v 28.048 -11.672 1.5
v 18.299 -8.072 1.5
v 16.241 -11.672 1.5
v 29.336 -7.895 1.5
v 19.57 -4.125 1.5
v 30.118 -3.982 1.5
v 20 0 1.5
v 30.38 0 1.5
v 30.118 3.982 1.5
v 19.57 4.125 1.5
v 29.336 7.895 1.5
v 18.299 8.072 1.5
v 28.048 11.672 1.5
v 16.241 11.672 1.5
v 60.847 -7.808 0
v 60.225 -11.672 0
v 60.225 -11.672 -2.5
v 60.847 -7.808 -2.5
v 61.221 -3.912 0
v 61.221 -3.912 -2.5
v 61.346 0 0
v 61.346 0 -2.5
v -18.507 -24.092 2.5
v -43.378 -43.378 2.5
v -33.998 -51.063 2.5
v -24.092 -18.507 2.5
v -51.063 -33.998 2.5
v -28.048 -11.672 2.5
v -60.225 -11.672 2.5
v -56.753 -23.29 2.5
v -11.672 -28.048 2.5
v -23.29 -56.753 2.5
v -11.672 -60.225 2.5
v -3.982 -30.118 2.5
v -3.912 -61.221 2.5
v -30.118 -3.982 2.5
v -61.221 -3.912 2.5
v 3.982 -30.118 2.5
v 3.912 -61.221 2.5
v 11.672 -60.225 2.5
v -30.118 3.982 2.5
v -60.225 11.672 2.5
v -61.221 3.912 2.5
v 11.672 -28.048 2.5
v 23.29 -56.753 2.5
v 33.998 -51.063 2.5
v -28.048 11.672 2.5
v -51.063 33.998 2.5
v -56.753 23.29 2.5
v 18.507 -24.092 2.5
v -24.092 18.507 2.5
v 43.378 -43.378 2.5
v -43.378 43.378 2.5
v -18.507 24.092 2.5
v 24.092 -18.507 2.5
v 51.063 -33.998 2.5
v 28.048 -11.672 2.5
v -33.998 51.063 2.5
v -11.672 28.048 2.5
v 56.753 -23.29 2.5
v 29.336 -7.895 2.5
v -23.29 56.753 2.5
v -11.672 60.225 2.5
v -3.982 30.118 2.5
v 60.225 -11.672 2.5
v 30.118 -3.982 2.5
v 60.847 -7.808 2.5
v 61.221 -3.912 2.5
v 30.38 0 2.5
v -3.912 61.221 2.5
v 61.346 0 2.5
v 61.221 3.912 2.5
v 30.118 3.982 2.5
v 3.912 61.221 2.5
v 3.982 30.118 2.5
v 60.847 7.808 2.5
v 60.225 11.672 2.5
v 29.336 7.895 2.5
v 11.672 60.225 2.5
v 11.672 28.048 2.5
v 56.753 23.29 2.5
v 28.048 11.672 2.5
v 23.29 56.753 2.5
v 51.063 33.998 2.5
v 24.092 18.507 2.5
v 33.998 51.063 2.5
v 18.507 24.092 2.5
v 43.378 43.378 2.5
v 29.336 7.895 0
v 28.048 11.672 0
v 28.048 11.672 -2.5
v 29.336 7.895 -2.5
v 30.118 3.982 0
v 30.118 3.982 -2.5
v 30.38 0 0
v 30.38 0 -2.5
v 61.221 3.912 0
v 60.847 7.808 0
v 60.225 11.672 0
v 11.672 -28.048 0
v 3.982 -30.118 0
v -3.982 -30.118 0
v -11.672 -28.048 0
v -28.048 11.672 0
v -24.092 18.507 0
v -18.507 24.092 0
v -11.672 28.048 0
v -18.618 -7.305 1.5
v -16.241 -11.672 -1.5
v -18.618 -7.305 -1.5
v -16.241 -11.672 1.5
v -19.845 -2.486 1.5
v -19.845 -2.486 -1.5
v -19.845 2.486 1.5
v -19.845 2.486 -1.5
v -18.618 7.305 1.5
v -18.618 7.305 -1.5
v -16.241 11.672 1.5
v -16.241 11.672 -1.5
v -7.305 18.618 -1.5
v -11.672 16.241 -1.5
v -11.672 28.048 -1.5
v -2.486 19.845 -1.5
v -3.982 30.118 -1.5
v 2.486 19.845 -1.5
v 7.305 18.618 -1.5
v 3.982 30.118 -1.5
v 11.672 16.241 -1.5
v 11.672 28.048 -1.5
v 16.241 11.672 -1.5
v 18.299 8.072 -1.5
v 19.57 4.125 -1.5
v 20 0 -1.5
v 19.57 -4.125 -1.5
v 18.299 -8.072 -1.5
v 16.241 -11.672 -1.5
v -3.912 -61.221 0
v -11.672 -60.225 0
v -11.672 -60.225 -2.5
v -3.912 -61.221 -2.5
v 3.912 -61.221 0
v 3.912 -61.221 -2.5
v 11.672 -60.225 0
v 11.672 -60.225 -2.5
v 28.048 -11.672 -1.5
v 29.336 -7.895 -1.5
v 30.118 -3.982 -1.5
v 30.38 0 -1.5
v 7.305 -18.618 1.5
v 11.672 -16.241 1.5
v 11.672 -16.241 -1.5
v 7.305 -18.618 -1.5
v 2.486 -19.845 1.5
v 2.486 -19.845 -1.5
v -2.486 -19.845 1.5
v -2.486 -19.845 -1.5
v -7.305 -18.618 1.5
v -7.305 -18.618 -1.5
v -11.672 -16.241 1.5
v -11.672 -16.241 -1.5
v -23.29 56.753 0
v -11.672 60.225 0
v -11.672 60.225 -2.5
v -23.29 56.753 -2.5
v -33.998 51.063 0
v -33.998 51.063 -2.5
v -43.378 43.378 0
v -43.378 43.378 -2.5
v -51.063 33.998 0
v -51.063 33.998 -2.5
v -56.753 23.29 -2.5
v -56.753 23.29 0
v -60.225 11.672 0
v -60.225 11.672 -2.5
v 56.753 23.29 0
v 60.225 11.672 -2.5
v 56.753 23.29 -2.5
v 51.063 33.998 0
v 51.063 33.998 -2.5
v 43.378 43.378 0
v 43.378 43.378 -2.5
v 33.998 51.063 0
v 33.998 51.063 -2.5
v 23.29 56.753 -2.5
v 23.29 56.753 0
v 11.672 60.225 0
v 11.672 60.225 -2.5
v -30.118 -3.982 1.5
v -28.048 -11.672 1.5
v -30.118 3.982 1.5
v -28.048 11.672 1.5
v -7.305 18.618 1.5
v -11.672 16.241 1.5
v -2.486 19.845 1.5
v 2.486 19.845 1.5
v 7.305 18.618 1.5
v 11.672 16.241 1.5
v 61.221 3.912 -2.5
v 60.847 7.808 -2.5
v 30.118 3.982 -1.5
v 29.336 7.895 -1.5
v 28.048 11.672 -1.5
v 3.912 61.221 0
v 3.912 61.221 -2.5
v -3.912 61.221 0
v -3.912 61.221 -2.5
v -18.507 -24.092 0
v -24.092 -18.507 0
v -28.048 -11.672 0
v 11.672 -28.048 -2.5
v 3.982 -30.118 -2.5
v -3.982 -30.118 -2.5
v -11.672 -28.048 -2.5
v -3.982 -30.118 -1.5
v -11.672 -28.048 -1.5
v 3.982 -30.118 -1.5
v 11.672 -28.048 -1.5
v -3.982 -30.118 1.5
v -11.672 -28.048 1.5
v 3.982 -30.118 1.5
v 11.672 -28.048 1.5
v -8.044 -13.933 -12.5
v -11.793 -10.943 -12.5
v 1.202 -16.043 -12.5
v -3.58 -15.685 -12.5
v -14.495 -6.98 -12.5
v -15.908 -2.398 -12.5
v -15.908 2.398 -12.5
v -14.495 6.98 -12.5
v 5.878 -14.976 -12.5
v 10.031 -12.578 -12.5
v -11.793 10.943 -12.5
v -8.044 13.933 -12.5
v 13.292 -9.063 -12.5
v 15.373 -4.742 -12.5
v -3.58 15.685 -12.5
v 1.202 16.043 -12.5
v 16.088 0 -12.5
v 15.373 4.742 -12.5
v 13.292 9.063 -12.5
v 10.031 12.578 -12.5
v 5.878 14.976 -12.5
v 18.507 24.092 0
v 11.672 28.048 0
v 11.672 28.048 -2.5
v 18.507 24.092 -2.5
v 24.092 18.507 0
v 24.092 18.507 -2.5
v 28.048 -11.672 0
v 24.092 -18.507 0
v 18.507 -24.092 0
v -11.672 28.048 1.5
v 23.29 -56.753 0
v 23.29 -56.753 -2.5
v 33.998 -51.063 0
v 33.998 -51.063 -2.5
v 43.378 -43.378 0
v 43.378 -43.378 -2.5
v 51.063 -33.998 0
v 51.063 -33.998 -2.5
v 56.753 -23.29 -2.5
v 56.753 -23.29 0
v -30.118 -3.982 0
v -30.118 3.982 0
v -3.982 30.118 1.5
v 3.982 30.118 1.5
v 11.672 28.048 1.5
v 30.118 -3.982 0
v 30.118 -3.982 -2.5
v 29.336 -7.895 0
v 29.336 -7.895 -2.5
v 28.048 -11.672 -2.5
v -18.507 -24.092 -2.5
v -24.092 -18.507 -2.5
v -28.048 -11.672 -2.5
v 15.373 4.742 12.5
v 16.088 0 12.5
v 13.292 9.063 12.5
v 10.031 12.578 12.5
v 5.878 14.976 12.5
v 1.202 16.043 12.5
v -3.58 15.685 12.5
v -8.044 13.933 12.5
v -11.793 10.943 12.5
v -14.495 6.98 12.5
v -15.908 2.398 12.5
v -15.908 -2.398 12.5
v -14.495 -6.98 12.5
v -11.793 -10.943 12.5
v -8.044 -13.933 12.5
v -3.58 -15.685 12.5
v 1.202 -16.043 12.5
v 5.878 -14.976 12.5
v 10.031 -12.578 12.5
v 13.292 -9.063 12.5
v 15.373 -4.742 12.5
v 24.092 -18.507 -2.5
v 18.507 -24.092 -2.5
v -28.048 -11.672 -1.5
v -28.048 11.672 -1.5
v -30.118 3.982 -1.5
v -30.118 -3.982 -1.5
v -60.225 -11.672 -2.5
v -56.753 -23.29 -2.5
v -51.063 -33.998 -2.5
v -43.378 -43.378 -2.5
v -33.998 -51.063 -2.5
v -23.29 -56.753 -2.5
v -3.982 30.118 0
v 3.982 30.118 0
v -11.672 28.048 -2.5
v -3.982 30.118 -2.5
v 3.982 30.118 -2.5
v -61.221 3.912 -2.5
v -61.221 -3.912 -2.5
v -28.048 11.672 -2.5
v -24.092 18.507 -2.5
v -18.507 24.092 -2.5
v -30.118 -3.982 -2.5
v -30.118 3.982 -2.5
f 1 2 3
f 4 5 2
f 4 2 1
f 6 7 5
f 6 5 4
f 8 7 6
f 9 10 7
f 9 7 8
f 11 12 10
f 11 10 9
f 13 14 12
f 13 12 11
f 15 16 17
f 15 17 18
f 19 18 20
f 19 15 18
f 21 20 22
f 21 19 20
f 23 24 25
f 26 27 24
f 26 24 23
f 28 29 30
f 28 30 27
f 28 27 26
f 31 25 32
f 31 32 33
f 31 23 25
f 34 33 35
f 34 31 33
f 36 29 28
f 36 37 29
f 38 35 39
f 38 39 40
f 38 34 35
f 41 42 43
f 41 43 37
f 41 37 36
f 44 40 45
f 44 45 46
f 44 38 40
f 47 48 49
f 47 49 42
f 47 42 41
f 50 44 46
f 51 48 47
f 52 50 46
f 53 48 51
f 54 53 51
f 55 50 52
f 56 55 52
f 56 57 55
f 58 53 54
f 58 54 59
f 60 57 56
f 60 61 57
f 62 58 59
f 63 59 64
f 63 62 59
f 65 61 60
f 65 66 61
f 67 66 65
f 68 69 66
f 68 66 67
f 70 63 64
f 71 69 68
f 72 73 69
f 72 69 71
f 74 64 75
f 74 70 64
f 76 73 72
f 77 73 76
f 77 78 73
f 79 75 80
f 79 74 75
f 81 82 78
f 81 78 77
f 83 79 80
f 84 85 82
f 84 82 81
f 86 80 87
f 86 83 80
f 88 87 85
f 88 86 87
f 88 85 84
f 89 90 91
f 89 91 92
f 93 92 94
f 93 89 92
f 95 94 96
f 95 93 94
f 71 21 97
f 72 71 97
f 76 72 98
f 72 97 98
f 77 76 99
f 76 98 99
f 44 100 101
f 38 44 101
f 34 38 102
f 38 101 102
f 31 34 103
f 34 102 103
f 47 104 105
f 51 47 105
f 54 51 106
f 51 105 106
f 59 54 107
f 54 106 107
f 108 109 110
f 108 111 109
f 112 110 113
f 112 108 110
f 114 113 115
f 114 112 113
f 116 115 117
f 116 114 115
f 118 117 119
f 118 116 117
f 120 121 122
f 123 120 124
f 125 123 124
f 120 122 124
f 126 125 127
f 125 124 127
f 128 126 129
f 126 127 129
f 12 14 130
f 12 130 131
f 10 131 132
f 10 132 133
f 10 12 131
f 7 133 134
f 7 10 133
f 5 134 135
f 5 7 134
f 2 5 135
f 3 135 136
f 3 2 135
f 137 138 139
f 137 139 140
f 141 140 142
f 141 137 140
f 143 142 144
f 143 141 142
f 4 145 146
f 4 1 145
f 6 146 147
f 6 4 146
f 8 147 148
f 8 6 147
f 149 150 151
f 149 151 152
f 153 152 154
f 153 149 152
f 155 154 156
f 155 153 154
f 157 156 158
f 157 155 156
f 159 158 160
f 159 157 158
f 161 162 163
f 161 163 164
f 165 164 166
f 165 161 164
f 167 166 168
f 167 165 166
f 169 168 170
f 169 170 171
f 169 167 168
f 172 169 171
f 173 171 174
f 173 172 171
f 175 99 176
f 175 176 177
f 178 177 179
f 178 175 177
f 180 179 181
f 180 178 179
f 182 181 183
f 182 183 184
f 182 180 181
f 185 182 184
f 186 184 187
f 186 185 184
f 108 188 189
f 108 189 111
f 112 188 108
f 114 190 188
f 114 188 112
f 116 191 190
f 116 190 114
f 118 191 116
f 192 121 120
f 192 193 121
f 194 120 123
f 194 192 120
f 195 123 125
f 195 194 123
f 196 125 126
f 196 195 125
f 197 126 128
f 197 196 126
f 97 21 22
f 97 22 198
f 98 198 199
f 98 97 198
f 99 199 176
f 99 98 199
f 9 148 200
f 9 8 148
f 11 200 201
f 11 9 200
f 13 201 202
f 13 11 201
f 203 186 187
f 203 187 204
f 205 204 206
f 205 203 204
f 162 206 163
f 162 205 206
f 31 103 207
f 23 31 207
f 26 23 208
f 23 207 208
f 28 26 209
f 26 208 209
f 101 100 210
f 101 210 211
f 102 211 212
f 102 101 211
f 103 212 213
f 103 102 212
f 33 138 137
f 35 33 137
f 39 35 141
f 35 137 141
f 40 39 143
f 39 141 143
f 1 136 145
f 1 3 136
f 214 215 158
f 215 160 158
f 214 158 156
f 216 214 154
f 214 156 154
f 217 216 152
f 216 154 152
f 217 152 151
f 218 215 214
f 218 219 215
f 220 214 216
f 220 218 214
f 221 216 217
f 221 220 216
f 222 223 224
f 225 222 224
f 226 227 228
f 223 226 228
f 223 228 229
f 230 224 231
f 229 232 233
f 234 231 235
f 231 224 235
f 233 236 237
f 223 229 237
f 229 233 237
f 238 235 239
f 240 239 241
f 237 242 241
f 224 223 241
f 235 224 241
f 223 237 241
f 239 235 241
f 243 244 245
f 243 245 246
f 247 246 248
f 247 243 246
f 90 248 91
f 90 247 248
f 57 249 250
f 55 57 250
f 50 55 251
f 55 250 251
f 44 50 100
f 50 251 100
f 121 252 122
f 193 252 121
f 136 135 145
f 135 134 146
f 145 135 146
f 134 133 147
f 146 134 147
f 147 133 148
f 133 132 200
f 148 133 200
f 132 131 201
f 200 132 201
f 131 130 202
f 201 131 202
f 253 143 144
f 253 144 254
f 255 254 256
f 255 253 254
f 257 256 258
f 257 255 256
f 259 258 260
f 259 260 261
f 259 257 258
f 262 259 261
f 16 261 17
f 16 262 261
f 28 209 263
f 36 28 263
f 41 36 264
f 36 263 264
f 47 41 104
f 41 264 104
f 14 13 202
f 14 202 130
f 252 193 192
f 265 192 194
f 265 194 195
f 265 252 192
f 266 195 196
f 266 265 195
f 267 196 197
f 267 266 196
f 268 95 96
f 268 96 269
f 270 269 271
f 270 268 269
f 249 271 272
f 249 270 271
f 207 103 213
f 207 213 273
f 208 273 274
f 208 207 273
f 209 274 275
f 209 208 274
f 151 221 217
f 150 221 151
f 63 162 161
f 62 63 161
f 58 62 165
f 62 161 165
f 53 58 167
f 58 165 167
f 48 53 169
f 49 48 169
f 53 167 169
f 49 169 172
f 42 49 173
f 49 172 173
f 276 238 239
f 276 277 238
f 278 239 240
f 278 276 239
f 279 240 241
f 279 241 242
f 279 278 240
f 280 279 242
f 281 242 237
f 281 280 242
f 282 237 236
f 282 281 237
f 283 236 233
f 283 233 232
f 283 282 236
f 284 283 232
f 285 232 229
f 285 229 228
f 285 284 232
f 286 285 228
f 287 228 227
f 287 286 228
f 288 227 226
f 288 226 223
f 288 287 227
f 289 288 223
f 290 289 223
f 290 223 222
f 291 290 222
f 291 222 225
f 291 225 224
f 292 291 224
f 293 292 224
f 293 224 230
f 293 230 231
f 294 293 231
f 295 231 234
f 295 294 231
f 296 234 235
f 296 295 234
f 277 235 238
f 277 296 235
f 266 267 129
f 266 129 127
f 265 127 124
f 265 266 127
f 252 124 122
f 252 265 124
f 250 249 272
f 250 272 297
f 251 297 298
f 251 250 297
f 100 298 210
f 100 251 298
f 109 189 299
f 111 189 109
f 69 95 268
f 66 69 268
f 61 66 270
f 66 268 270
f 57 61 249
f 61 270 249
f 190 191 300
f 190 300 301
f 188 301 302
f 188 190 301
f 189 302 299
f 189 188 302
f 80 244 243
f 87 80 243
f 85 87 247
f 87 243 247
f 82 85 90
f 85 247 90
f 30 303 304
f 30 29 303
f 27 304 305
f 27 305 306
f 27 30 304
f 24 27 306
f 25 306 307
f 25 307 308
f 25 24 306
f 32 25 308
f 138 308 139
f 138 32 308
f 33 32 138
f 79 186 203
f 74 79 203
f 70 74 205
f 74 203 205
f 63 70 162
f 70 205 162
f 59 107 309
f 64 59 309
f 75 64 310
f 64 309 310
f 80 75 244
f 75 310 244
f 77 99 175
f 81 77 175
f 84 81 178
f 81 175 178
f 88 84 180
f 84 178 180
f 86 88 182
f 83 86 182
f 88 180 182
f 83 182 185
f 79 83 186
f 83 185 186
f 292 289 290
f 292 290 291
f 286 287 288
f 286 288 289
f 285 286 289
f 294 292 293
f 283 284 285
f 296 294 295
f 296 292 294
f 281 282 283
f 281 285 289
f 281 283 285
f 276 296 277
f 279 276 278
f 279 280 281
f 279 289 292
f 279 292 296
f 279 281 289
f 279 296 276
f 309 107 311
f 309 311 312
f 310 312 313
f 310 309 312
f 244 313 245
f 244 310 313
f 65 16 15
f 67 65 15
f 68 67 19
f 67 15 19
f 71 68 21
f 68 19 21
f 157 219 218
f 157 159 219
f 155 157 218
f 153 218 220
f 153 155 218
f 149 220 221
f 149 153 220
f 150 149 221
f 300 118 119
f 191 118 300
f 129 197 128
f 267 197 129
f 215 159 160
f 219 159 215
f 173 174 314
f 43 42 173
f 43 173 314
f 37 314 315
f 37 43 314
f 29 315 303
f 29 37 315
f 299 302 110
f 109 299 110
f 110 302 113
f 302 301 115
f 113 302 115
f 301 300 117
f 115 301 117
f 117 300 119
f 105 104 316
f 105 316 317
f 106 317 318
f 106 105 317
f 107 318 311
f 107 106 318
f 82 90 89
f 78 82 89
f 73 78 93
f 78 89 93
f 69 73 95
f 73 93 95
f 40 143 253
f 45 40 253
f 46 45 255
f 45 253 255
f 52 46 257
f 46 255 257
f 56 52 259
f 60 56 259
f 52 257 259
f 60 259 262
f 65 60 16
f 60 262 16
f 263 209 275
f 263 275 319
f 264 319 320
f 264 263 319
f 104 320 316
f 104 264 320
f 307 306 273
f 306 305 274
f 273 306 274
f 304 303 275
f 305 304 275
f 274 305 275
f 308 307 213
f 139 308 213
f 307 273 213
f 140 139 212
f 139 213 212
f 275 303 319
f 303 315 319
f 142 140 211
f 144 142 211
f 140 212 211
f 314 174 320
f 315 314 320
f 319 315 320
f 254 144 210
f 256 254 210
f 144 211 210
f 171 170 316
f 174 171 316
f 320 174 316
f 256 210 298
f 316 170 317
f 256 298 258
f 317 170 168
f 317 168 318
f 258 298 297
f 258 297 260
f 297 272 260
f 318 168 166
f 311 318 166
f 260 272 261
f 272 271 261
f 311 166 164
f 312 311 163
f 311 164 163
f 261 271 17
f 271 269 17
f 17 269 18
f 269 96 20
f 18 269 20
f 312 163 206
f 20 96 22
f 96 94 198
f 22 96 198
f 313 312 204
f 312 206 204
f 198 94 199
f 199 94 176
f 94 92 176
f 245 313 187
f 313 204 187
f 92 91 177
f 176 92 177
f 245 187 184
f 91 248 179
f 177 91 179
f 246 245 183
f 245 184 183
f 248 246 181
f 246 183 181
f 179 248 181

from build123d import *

# Parameters (mm, degrees)
F1_DEPTH = 2.5
F2_DEPTH = 1.5
F0_R     = 16.0879189499
F3_DEPTH = 12.5


with BuildPart() as f1:
    # F0 (on Top) → F1 (new body, symmetric)
    with BuildSketch(Plane.XY):
        with BuildLine():
            ThreePointArc((-60.2253776831, -11.6721854729), (-43.3781974659, -43.3781974659), (-11.6721854729, -60.2253776831))
            Line((-11.6721854729, -60.2253776831), (-11.6721854729, -28.0478593798))
            ThreePointArc((-11.6721854729, -28.0478593798), (-21.4816471611, -21.4816471611), (-28.0478593798, -11.6721854729))
            Line((-28.0478593798, -11.6721854729), (-60.2253776831, -11.6721854729))
        make_face()
        with BuildLine():
            Line((-28.0478593798, 11.6721854729), (-60.2253776831, 11.6721854729))
            ThreePointArc((-60.2253776831, 11.6721854729), (-61.3460351676, 0), (-60.2253776831, -11.6721854729))
            Line((-60.2253776831, -11.6721854729), (-28.0478593798, -11.6721854729))
            ThreePointArc((-28.0478593798, -11.6721854729), (-30.3796367573, 0), (-28.0478593798, 11.6721854729))
        make_face()
        with BuildLine():
            Line((-11.6721854729, 28.0478593798), (-11.6721854729, 60.2253776831))
            ThreePointArc((-11.6721854729, 60.2253776831), (-43.3781974659, 43.3781974659), (-60.2253776831, 11.6721854729))
            Line((-60.2253776831, 11.6721854729), (-28.0478593798, 11.6721854729))
            ThreePointArc((-28.0478593798, 11.6721854729), (-21.4816471611, 21.4816471611), (-11.6721854729, 28.0478593798))
        make_face()
        with BuildLine():
            Line((11.6721854729, 28.0478593799), (11.6721854729, 60.2253776831))
            ThreePointArc((11.6721854729, 60.2253776831), (0, 61.3460351676), (-11.6721854729, 60.2253776831))
            Line((-11.6721854729, 60.2253776831), (-11.6721854729, 28.0478593798))
            ThreePointArc((-11.6721854729, 28.0478593798), (0, 30.3796367573), (11.6721854729, 28.0478593798))
        make_face()
        with BuildLine():
            Line((28.0478593798, 11.6721854729), (60.2253776831, 11.6721854729))
            ThreePointArc((60.2253776831, 11.6721854729), (43.3781974659, 43.3781974659), (11.6721854729, 60.2253776831))
            Line((11.6721854729, 60.2253776831), (11.6721854729, 28.0478593799))
            ThreePointArc((11.6721854729, 28.0478593798), (21.4816471611, 21.4816471611), (28.0478593798, 11.6721854729))
        make_face()
        with BuildLine():
            ThreePointArc((60.2253776831, -11.6721854729), (61.0652281094, -5.8629298757), (61.3460351676, 0))
            ThreePointArc((61.3460351676, 0), (61.0652281094, 5.8629298757), (60.2253776831, 11.6721854729))
            Line((60.2253776831, 11.6721854729), (28.0478593798, 11.6721854729))
            ThreePointArc((28.0478593798, 11.6721854729), (29.7909894875, 5.9514094854), (30.3796367573, 0))
            ThreePointArc((30.3796367573, 0), (29.7909894875, -5.9514094854), (28.0478593798, -11.6721854729))
            Line((28.0478593798, -11.6721854729), (60.2253776831, -11.6721854729))
        make_face()
        with BuildLine():
            ThreePointArc((11.6721854729, -60.2253776831), (43.3781974659, -43.3781974659), (60.2253776831, -11.6721854729))
            Line((60.2253776831, -11.6721854729), (28.0478593798, -11.6721854729))
            ThreePointArc((28.0478593798, -11.6721854729), (21.4816471611, -21.4816471611), (11.6721854729, -28.0478593798))
            Line((11.6721854729, -28.0478593799), (11.6721854729, -60.2253776831))
        make_face()
        with BuildLine():
            ThreePointArc((-11.6721854729, -60.2253776831), (0, -61.3460351676), (11.6721854729, -60.2253776831))
            Line((11.6721854729, -60.2253776831), (11.6721854729, -28.0478593799))
            ThreePointArc((11.6721854729, -28.0478593798), (0, -30.3796367573), (-11.6721854729, -28.0478593798))
            Line((-11.6721854729, -28.0478593798), (-11.6721854729, -60.2253776831))
        make_face()
    extrude(amount=F1_DEPTH, both=True)


with BuildPart() as f2:
    # F0 (on Top) → F2 (new body, symmetric)
    with BuildSketch(Plane.XY):
        with BuildLine():
            Line((-16.240692297, 11.6721854729), (-28.0478593798, 11.6721854729))
            ThreePointArc((-28.0478593798, 11.6721854729), (-30.3796367573, 0), (-28.0478593798, -11.6721854729))
            Line((-28.0478593798, -11.6721854729), (-16.240692297, -11.6721854729))
            ThreePointArc((-16.240692297, -11.6721854729), (-20, 0), (-16.240692297, 11.6721854729))
        make_face()
    extrude(amount=F2_DEPTH, both=True)


with BuildPart() as f2b:
    # F0 (on Top) → F2, piece 2 (new body, symmetric)
    with BuildSketch(Plane.XY):
        with BuildLine():
            Line((11.6721854729, 16.240692297), (11.6721854729, 28.0478593799))
            ThreePointArc((11.6721854729, 28.0478593798), (0, 30.3796367573), (-11.6721854729, 28.0478593798))
            Line((-11.6721854729, 28.0478593798), (-11.6721854729, 16.240692297))
            ThreePointArc((-11.6721854729, 16.240692297), (0, 20), (11.6721854729, 16.240692297))
        make_face()
    extrude(amount=F2_DEPTH, both=True)


with BuildPart() as f2c:
    # F0 (on Top) → F2, piece 3 (new body, symmetric)
    with BuildSketch(Plane.XY):
        with BuildLine():
            ThreePointArc((30.3796367573, 0), (29.7909894875, 5.9514094854), (28.0478593798, 11.6721854729))
            Line((28.0478593798, 11.6721854729), (16.240692297, 11.6721854729))
            ThreePointArc((16.240692297, 11.6721854729), (19.0369882852, 6.1313193547), (20, 0))
            ThreePointArc((20, 0), (19.0369882852, -6.1313193547), (16.240692297, -11.6721854729))
            Line((16.240692297, -11.6721854729), (28.0478593798, -11.6721854729))
            ThreePointArc((28.0478593798, -11.6721854729), (29.7909894875, -5.9514094854), (30.3796367573, 0))
        make_face()
    extrude(amount=F2_DEPTH, both=True)


with BuildPart() as f2d:
    # F0 (on Top) → F2, piece 4 (new body, symmetric)
    with BuildSketch(Plane.XY):
        with BuildLine():
            ThreePointArc((-11.6721854729, -28.0478593798), (0, -30.3796367573), (11.6721854729, -28.0478593798))
            Line((11.6721854729, -28.0478593799), (11.6721854729, -16.240692297))
            ThreePointArc((11.6721854729, -16.240692297), (0, -20), (-11.6721854729, -16.240692297))
            Line((-11.6721854729, -16.240692297), (-11.6721854729, -28.0478593798))
        make_face()
    extrude(amount=F2_DEPTH, both=True)


with BuildPart() as f3:
    # F0 (on Top) → F3 (new body, symmetric)
    with BuildSketch(Plane.XY):
        Circle(F0_R)
    extrude(amount=F3_DEPTH, both=True)


solid = Compound([f1.part, f2.part, f2b.part, f2c.part, f2d.part, f3.part])
